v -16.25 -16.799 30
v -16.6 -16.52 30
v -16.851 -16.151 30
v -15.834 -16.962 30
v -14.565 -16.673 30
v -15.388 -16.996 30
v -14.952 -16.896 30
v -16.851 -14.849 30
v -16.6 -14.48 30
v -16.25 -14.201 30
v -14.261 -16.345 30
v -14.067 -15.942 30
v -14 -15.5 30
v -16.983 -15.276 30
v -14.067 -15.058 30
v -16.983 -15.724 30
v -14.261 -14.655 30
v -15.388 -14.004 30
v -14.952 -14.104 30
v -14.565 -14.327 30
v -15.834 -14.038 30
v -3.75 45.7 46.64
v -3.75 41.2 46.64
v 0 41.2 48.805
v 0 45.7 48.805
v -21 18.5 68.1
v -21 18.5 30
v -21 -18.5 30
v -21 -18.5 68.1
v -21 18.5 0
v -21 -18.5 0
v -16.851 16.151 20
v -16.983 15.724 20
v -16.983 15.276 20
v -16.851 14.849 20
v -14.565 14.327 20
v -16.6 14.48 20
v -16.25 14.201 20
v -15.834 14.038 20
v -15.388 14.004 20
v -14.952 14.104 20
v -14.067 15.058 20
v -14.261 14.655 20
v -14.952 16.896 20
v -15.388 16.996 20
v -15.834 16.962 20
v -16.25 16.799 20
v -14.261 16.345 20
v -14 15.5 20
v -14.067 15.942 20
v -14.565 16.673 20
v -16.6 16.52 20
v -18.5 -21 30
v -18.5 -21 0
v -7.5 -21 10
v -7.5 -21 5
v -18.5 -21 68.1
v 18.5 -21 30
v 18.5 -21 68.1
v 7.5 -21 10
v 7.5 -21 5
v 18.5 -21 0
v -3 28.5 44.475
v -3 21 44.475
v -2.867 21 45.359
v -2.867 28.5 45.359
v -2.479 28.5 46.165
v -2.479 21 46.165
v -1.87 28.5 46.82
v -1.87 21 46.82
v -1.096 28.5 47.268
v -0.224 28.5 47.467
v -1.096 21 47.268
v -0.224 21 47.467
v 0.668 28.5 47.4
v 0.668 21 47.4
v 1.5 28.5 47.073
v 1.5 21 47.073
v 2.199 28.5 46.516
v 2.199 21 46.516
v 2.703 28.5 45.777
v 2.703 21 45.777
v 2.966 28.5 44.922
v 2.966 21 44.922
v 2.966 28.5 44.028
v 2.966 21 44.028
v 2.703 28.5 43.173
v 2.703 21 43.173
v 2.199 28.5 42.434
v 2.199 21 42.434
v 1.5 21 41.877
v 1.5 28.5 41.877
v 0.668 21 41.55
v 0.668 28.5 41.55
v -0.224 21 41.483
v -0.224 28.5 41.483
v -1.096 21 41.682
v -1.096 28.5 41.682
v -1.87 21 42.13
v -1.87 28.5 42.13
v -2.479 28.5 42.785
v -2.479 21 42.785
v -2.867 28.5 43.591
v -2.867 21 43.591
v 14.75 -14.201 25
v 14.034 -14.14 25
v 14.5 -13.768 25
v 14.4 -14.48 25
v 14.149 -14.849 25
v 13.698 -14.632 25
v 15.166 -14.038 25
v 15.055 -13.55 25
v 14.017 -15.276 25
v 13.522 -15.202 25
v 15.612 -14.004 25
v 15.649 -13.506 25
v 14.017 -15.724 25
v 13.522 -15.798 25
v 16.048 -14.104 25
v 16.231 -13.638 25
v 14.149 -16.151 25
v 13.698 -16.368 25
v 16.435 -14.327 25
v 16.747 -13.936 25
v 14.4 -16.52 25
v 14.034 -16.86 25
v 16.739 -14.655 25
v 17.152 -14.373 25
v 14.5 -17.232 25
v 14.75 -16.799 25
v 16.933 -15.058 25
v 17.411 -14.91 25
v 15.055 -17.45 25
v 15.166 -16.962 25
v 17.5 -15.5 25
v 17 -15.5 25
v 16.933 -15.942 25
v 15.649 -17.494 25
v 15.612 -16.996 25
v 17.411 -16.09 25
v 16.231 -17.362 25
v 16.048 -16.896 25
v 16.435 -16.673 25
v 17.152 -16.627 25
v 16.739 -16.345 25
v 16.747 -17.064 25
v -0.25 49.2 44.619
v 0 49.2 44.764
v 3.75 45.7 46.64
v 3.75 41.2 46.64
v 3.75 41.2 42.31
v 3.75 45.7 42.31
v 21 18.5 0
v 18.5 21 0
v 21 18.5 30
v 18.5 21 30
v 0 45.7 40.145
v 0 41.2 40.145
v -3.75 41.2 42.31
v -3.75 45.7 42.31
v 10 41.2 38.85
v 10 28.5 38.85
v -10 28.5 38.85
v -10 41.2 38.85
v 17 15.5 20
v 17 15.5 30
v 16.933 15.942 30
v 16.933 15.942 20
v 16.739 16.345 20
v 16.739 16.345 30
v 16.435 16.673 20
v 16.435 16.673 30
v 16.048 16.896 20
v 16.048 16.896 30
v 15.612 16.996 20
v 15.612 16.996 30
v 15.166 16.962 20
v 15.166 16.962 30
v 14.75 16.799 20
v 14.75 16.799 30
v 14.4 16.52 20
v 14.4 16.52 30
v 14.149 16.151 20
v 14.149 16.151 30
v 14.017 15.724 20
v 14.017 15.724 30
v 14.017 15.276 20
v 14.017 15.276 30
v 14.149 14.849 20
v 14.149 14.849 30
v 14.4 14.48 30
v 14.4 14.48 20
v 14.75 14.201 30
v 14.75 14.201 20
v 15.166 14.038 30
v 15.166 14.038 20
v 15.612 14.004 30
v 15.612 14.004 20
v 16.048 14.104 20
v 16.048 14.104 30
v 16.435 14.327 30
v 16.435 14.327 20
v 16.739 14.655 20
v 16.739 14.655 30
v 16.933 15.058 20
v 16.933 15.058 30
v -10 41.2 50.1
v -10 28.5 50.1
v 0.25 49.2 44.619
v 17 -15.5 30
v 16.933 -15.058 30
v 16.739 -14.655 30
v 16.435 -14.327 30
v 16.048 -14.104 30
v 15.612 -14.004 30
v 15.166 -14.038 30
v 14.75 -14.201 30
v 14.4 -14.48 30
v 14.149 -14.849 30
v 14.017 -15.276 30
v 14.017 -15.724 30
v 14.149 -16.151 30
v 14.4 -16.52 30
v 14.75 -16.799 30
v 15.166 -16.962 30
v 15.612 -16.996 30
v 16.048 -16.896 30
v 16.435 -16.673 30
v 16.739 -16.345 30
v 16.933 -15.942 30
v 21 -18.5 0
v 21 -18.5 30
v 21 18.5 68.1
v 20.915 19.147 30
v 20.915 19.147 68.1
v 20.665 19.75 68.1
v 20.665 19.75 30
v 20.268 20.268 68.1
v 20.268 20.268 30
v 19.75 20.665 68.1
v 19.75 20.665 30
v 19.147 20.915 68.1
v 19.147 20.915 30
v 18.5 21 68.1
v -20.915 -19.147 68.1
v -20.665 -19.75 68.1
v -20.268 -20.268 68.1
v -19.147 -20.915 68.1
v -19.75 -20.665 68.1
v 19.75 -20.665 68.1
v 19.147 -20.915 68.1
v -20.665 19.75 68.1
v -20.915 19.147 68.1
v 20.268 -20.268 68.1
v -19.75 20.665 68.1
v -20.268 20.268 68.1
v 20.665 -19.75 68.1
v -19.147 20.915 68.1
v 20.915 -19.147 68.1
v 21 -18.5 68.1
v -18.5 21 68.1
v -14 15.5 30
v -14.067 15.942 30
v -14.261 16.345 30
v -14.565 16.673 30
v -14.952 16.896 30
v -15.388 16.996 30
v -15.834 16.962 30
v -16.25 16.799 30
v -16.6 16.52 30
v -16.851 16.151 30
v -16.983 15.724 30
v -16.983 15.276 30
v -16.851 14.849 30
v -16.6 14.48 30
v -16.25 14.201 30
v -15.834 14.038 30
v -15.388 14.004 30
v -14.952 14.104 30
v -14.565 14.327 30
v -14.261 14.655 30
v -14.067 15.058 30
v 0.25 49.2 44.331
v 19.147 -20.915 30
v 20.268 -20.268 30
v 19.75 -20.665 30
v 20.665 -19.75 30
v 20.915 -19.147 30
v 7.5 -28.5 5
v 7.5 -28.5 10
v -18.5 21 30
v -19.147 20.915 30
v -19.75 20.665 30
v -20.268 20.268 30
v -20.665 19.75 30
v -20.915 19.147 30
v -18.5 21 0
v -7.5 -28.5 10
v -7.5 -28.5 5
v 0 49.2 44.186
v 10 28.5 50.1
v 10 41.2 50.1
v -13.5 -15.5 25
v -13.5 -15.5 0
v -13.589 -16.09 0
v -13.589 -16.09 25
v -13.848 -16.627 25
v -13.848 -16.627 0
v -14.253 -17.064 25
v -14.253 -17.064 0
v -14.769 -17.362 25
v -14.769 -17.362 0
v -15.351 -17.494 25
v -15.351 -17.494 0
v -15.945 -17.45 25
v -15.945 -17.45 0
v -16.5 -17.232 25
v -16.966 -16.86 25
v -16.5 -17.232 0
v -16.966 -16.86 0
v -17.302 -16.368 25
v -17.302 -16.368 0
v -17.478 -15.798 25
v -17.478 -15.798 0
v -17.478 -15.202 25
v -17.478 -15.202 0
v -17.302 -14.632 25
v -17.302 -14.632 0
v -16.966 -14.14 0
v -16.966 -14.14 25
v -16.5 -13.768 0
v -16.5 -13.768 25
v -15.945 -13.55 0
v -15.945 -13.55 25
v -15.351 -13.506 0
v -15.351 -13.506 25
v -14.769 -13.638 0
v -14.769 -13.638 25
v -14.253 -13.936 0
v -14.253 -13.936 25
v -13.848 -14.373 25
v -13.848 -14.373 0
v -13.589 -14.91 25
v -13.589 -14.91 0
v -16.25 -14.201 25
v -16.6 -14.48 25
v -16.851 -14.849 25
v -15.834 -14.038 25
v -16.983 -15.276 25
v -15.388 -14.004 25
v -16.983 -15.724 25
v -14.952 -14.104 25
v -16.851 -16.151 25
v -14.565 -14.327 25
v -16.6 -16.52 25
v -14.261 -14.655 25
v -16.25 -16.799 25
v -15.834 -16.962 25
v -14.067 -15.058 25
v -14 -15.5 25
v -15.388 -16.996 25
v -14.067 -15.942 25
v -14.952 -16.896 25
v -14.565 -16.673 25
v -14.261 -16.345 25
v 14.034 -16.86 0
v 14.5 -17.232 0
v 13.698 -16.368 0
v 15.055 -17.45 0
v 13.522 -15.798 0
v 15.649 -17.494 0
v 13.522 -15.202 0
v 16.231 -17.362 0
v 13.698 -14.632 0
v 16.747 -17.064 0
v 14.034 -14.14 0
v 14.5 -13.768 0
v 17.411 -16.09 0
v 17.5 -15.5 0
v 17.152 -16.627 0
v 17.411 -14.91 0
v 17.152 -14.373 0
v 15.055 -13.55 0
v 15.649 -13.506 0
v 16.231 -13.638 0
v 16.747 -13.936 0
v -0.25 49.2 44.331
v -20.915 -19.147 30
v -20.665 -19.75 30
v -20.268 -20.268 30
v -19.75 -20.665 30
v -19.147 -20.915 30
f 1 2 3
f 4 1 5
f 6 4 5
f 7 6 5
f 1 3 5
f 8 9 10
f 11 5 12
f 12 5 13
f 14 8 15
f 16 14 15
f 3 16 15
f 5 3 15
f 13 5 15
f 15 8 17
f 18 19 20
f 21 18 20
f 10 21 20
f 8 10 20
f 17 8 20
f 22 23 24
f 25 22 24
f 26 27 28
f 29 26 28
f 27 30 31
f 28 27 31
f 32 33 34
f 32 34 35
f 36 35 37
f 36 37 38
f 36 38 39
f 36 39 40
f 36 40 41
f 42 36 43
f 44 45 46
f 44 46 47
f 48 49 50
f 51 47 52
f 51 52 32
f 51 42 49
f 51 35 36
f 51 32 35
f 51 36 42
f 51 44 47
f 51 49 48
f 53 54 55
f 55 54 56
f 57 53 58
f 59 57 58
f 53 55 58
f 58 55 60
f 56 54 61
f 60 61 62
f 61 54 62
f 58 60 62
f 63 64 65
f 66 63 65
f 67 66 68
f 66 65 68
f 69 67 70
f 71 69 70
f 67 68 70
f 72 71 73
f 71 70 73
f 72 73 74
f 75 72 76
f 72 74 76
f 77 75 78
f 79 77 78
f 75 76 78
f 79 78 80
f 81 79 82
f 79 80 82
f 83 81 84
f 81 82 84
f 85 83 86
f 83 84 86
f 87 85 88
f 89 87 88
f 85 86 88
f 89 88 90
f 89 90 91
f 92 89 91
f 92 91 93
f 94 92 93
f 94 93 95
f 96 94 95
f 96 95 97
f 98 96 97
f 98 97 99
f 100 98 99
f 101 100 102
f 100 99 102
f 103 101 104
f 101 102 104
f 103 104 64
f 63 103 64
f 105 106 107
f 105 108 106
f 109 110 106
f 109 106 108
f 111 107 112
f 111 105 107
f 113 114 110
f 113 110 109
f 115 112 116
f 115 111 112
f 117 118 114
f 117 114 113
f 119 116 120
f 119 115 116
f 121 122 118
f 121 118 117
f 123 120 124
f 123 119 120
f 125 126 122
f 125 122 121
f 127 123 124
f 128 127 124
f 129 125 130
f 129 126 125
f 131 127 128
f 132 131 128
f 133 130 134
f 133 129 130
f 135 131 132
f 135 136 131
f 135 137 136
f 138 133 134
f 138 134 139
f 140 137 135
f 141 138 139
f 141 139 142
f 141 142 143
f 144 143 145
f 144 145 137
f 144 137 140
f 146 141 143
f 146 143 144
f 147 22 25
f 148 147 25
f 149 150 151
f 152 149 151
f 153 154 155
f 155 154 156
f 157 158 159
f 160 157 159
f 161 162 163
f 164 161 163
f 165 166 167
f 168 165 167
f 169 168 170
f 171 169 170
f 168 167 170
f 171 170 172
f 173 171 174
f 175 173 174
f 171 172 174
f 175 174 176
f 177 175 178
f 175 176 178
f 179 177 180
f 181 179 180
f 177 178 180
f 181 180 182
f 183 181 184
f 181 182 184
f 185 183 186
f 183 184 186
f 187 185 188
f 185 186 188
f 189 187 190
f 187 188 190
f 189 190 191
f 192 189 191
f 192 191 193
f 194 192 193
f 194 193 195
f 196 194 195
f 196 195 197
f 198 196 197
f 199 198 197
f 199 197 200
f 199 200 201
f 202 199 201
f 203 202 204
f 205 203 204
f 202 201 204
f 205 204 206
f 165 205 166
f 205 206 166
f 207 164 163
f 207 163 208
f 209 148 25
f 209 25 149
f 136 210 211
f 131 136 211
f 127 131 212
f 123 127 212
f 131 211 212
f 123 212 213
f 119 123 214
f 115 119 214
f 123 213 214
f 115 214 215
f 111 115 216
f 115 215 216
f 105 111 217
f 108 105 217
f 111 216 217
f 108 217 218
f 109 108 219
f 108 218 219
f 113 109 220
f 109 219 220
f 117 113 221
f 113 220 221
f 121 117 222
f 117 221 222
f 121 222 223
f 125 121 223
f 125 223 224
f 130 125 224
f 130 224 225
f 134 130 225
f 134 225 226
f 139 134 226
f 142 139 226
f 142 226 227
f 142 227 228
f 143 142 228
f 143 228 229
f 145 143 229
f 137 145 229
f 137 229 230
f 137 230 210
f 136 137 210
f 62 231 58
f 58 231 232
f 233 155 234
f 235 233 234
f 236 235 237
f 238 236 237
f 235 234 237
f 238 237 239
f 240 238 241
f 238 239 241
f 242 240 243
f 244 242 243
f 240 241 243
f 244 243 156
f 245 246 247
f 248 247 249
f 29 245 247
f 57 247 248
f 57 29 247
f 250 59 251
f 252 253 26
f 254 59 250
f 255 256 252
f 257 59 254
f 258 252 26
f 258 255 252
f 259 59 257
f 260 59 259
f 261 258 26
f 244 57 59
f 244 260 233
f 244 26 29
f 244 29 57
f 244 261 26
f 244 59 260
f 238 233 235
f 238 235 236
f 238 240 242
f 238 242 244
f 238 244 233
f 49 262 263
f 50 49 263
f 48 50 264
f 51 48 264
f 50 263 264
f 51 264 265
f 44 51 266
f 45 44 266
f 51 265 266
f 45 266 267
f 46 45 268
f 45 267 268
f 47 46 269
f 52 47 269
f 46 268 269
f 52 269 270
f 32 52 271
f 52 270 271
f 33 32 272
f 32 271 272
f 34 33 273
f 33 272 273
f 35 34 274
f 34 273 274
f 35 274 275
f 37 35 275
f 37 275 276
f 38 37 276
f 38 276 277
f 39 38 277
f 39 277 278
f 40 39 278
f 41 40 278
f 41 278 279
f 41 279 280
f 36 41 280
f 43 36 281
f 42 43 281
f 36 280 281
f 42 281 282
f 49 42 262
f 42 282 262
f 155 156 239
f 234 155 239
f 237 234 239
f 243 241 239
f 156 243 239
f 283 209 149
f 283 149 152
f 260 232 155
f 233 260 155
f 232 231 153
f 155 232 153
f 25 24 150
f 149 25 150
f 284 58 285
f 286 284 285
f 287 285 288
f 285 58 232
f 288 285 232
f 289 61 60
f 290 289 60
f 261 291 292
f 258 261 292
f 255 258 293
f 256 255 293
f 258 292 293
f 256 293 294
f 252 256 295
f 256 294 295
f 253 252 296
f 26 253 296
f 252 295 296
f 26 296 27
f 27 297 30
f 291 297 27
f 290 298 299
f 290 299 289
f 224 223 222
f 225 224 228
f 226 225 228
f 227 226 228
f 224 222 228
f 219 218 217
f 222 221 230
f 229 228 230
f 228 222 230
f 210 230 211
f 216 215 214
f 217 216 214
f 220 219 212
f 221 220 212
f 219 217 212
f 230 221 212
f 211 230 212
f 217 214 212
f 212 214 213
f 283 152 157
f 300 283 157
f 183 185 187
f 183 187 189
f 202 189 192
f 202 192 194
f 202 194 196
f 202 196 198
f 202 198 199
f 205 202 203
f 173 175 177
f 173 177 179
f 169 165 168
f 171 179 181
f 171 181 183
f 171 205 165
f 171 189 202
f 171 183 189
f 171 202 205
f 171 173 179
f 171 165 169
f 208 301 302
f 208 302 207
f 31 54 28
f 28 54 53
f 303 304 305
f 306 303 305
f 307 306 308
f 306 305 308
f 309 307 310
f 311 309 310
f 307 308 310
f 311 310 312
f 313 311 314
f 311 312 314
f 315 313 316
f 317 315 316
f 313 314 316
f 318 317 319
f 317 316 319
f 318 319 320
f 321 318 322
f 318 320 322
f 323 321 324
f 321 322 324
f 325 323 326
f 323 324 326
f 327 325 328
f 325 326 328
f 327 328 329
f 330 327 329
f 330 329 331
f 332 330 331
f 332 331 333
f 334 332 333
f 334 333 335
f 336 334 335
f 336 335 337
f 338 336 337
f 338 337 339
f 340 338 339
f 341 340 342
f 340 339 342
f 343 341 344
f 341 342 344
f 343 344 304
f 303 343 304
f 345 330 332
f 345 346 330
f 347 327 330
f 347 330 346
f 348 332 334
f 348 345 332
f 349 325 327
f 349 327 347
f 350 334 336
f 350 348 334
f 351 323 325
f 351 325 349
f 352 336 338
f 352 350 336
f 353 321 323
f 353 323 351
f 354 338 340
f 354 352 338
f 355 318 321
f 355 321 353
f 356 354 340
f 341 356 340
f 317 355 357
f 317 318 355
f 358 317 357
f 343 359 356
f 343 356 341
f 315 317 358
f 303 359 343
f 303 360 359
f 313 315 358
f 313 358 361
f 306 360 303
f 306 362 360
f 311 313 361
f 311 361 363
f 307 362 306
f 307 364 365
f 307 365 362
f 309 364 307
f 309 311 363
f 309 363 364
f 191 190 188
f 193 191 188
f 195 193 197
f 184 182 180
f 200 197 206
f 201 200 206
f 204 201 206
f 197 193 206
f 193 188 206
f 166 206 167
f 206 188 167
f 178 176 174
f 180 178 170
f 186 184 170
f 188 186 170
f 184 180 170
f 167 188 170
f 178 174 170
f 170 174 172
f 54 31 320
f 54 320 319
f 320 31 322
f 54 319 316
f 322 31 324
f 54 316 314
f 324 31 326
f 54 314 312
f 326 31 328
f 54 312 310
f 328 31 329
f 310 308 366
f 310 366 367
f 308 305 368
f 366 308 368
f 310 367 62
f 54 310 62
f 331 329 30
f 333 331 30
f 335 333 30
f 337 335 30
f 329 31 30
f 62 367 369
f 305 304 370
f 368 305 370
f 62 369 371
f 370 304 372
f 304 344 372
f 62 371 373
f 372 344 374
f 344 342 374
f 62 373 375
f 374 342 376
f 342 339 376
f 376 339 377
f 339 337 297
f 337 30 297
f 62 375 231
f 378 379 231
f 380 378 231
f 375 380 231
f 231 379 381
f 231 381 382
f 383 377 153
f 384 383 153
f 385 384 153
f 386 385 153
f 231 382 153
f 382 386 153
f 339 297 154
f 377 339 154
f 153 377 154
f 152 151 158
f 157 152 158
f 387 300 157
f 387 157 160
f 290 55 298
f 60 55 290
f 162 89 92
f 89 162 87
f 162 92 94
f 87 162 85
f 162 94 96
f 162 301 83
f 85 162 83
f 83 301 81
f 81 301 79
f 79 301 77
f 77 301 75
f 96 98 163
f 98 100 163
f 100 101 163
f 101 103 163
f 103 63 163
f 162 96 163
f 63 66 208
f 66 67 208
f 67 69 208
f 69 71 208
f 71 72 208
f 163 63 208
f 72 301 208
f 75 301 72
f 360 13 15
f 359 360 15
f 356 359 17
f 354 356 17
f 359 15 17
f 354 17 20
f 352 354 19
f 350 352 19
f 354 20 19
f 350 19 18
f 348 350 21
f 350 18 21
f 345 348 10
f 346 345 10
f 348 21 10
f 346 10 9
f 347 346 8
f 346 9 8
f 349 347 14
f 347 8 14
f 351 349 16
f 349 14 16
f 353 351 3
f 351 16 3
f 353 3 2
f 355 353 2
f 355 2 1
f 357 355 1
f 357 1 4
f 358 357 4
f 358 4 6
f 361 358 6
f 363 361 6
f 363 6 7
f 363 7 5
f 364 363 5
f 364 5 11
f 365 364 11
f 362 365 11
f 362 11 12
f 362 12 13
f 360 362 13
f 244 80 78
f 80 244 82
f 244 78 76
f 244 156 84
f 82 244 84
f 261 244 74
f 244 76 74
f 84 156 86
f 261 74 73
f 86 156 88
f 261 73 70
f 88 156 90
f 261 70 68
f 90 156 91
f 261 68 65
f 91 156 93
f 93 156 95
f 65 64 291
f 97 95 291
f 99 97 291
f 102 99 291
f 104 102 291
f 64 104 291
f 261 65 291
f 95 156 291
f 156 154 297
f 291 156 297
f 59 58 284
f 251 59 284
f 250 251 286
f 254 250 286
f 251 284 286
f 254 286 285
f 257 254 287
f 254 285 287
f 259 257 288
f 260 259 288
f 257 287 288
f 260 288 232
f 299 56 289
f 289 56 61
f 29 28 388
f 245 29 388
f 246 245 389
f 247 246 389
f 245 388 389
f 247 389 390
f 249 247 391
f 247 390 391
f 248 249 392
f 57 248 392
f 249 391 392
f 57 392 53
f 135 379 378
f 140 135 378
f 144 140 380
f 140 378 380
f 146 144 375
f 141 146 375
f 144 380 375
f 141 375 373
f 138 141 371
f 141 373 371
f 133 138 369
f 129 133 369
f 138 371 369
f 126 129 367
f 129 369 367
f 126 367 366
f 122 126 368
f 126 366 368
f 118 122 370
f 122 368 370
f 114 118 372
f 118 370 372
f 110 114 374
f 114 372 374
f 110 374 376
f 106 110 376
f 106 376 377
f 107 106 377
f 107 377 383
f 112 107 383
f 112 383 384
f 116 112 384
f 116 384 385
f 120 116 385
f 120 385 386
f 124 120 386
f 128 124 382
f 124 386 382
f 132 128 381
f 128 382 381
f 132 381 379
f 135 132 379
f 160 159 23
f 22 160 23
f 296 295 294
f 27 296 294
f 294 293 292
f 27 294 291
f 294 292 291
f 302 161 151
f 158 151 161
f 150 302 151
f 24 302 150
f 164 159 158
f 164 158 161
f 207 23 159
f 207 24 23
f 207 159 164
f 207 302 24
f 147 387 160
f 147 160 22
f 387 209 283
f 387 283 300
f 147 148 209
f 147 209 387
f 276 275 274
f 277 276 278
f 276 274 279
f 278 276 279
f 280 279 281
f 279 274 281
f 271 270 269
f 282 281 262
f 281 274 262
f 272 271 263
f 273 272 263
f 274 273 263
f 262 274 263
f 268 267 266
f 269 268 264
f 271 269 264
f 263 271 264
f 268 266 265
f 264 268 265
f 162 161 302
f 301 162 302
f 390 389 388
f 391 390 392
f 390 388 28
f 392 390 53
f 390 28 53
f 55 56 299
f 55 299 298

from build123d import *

# Parameters (mm, degrees)
F0_W      = 42
F0_H      = 42
F1_DEPTH  = 30
F2_SIZE   = 2.5
F3_R      = 1.5
F4_DEPTH  = 10
F5_R      = 11
F6_DEPTH  = 2
F8_DEPTH  = 24
F9_W      = 15
F9_H      = 5
F10_DEPTH = 7.5
F12_DEPTH = 38.1
F13_R     = 3
F14_DEPTH = 7.5
F15_W     = 20
F15_H     = 11.25
F16_DEPTH = 12.7
F18_DEPTH = 8
F19_SIZE  = 3.5
F20_R     = 2
F21_DEPTH = 25


with BuildPart() as f1:
    # F0 (on Top) → F1 (new body)
    with BuildSketch(Plane.XY):
        Rectangle(F0_W, F0_H)
    extrude(amount=F1_DEPTH)

    # F2
    f2_edges = [f1.edges().sort_by_distance(p)[0] for p in [
        (-21, -21, 15),
        (21, -21, 15),
        (21, 21, 15),
        (-21, 21, 15),
    ]]
    chamfer(f2_edges, length=F2_SIZE)

    # F3 (on face) → F4 (cut)
    with BuildSketch(Plane.XY.offset(30)):
        with Locations((-15.5, 15.5)):
            Circle(F3_R)
        with Locations((15.5, 15.5)):
            Circle(F3_R)
        with Locations((15.5, -15.5)):
            Circle(F3_R)
        with Locations((-15.5, -15.5)):
            Circle(F3_R)
    extrude(amount=-F4_DEPTH, mode=Mode.SUBTRACT)

    # F5 (on face) → F6 (join)
    with BuildSketch(Plane.XY.offset(30)):
        Circle(F5_R)
    extrude(amount=F6_DEPTH)

    # F7 (on face) → F8 (join)
    with BuildSketch(Plane.XY.offset(32)):
        with BuildLine():
            Line((2.193171, 1.2), (-2.193171, 1.2))
            ThreePointArc((-2.193171, 1.2), (0, -2.5), (2.193171, 1.2))
        make_face()
    extrude(amount=F8_DEPTH)

    # F9 (on face) → F10 (join)
    with BuildSketch(Plane.XZ.offset(21)):
        with Locations((0, 7.5)):
            Rectangle(F9_W, F9_H)
    extrude(amount=F10_DEPTH)

    # F11 (on face) → F12 (join)
    with BuildSketch(Plane.XY.offset(30)):
        with BuildLine():
            Line((-18.5, -21), (18.5, -21))
            ThreePointArc((18.5, -21), (20.267767, -20.267767), (21, -18.5))
            Line((21, -18.5), (21, 18.5))
            ThreePointArc((21, 18.5), (20.267767, 20.267767), (18.5, 21))
            Line((18.5, 21), (-18.5, 21))
            ThreePointArc((-18.5, 21), (-20.267767, 20.267767), (-21, 18.5))
            Line((-21, 18.5), (-21, -18.5))
            ThreePointArc((-21, -18.5), (-20.267767, -20.267767), (-18.5, -21))
        make_face()
    extrude(amount=F12_DEPTH)

    # F13 (on face) → F14 (join)
    with BuildSketch(Plane(origin=(0, 21, 0), x_dir=(-1, 0, 0), z_dir=(0, 1, 0))):
        with Locations((0, 44.475)):
            Circle(F13_R)
    extrude(amount=F14_DEPTH)

    # F15 (on face) → F16 (join)
    with BuildSketch(Plane(origin=(0, 28.5, 0), x_dir=(-1, 0, 0), z_dir=(0, 1, 0))):
        with Locations((0, 44.475)):
            Rectangle(F15_W, F15_H)
    extrude(amount=F16_DEPTH)

    # F17 (on face) → F18 (join)
    with BuildSketch(Plane(origin=(0, 41.2, 0), x_dir=(-1, 0, 0), z_dir=(0, 1, 0))):
        Polygon((3.75, 42.309936), (3.75, 46.640064), (0, 48.805127), (-3.75, 46.640064), (-3.75, 42.309936), (0, 40.144873), align=None)
    extrude(amount=F18_DEPTH)

    # F19
    f19_edges = [f1.edges().sort_by_distance(p)[0] for p in [
        (-1.875, 49.2, 41.227405),
        (1.875, 49.2, 47.722595),
        (-3.75, 49.2, 44.475),
        (1.875, 49.2, 41.227405),
        (3.75, 49.2, 44.475),
        (-1.875, 49.2, 47.722595),
    ]]
    chamfer(f19_edges, length=F19_SIZE)

    # F20 (on face) → F21 (cut)
    with BuildSketch(Plane(origin=(0, 0, 0), x_dir=(1, 0, 0), z_dir=(0, 0, -1))):
        with Locations((-15.5, 15.5)):
            Circle(F20_R)
        with Locations((15.5, 15.5)):
            Circle(F20_R)
    extrude(amount=-F21_DEPTH, mode=Mode.SUBTRACT)


solid = f1.part
